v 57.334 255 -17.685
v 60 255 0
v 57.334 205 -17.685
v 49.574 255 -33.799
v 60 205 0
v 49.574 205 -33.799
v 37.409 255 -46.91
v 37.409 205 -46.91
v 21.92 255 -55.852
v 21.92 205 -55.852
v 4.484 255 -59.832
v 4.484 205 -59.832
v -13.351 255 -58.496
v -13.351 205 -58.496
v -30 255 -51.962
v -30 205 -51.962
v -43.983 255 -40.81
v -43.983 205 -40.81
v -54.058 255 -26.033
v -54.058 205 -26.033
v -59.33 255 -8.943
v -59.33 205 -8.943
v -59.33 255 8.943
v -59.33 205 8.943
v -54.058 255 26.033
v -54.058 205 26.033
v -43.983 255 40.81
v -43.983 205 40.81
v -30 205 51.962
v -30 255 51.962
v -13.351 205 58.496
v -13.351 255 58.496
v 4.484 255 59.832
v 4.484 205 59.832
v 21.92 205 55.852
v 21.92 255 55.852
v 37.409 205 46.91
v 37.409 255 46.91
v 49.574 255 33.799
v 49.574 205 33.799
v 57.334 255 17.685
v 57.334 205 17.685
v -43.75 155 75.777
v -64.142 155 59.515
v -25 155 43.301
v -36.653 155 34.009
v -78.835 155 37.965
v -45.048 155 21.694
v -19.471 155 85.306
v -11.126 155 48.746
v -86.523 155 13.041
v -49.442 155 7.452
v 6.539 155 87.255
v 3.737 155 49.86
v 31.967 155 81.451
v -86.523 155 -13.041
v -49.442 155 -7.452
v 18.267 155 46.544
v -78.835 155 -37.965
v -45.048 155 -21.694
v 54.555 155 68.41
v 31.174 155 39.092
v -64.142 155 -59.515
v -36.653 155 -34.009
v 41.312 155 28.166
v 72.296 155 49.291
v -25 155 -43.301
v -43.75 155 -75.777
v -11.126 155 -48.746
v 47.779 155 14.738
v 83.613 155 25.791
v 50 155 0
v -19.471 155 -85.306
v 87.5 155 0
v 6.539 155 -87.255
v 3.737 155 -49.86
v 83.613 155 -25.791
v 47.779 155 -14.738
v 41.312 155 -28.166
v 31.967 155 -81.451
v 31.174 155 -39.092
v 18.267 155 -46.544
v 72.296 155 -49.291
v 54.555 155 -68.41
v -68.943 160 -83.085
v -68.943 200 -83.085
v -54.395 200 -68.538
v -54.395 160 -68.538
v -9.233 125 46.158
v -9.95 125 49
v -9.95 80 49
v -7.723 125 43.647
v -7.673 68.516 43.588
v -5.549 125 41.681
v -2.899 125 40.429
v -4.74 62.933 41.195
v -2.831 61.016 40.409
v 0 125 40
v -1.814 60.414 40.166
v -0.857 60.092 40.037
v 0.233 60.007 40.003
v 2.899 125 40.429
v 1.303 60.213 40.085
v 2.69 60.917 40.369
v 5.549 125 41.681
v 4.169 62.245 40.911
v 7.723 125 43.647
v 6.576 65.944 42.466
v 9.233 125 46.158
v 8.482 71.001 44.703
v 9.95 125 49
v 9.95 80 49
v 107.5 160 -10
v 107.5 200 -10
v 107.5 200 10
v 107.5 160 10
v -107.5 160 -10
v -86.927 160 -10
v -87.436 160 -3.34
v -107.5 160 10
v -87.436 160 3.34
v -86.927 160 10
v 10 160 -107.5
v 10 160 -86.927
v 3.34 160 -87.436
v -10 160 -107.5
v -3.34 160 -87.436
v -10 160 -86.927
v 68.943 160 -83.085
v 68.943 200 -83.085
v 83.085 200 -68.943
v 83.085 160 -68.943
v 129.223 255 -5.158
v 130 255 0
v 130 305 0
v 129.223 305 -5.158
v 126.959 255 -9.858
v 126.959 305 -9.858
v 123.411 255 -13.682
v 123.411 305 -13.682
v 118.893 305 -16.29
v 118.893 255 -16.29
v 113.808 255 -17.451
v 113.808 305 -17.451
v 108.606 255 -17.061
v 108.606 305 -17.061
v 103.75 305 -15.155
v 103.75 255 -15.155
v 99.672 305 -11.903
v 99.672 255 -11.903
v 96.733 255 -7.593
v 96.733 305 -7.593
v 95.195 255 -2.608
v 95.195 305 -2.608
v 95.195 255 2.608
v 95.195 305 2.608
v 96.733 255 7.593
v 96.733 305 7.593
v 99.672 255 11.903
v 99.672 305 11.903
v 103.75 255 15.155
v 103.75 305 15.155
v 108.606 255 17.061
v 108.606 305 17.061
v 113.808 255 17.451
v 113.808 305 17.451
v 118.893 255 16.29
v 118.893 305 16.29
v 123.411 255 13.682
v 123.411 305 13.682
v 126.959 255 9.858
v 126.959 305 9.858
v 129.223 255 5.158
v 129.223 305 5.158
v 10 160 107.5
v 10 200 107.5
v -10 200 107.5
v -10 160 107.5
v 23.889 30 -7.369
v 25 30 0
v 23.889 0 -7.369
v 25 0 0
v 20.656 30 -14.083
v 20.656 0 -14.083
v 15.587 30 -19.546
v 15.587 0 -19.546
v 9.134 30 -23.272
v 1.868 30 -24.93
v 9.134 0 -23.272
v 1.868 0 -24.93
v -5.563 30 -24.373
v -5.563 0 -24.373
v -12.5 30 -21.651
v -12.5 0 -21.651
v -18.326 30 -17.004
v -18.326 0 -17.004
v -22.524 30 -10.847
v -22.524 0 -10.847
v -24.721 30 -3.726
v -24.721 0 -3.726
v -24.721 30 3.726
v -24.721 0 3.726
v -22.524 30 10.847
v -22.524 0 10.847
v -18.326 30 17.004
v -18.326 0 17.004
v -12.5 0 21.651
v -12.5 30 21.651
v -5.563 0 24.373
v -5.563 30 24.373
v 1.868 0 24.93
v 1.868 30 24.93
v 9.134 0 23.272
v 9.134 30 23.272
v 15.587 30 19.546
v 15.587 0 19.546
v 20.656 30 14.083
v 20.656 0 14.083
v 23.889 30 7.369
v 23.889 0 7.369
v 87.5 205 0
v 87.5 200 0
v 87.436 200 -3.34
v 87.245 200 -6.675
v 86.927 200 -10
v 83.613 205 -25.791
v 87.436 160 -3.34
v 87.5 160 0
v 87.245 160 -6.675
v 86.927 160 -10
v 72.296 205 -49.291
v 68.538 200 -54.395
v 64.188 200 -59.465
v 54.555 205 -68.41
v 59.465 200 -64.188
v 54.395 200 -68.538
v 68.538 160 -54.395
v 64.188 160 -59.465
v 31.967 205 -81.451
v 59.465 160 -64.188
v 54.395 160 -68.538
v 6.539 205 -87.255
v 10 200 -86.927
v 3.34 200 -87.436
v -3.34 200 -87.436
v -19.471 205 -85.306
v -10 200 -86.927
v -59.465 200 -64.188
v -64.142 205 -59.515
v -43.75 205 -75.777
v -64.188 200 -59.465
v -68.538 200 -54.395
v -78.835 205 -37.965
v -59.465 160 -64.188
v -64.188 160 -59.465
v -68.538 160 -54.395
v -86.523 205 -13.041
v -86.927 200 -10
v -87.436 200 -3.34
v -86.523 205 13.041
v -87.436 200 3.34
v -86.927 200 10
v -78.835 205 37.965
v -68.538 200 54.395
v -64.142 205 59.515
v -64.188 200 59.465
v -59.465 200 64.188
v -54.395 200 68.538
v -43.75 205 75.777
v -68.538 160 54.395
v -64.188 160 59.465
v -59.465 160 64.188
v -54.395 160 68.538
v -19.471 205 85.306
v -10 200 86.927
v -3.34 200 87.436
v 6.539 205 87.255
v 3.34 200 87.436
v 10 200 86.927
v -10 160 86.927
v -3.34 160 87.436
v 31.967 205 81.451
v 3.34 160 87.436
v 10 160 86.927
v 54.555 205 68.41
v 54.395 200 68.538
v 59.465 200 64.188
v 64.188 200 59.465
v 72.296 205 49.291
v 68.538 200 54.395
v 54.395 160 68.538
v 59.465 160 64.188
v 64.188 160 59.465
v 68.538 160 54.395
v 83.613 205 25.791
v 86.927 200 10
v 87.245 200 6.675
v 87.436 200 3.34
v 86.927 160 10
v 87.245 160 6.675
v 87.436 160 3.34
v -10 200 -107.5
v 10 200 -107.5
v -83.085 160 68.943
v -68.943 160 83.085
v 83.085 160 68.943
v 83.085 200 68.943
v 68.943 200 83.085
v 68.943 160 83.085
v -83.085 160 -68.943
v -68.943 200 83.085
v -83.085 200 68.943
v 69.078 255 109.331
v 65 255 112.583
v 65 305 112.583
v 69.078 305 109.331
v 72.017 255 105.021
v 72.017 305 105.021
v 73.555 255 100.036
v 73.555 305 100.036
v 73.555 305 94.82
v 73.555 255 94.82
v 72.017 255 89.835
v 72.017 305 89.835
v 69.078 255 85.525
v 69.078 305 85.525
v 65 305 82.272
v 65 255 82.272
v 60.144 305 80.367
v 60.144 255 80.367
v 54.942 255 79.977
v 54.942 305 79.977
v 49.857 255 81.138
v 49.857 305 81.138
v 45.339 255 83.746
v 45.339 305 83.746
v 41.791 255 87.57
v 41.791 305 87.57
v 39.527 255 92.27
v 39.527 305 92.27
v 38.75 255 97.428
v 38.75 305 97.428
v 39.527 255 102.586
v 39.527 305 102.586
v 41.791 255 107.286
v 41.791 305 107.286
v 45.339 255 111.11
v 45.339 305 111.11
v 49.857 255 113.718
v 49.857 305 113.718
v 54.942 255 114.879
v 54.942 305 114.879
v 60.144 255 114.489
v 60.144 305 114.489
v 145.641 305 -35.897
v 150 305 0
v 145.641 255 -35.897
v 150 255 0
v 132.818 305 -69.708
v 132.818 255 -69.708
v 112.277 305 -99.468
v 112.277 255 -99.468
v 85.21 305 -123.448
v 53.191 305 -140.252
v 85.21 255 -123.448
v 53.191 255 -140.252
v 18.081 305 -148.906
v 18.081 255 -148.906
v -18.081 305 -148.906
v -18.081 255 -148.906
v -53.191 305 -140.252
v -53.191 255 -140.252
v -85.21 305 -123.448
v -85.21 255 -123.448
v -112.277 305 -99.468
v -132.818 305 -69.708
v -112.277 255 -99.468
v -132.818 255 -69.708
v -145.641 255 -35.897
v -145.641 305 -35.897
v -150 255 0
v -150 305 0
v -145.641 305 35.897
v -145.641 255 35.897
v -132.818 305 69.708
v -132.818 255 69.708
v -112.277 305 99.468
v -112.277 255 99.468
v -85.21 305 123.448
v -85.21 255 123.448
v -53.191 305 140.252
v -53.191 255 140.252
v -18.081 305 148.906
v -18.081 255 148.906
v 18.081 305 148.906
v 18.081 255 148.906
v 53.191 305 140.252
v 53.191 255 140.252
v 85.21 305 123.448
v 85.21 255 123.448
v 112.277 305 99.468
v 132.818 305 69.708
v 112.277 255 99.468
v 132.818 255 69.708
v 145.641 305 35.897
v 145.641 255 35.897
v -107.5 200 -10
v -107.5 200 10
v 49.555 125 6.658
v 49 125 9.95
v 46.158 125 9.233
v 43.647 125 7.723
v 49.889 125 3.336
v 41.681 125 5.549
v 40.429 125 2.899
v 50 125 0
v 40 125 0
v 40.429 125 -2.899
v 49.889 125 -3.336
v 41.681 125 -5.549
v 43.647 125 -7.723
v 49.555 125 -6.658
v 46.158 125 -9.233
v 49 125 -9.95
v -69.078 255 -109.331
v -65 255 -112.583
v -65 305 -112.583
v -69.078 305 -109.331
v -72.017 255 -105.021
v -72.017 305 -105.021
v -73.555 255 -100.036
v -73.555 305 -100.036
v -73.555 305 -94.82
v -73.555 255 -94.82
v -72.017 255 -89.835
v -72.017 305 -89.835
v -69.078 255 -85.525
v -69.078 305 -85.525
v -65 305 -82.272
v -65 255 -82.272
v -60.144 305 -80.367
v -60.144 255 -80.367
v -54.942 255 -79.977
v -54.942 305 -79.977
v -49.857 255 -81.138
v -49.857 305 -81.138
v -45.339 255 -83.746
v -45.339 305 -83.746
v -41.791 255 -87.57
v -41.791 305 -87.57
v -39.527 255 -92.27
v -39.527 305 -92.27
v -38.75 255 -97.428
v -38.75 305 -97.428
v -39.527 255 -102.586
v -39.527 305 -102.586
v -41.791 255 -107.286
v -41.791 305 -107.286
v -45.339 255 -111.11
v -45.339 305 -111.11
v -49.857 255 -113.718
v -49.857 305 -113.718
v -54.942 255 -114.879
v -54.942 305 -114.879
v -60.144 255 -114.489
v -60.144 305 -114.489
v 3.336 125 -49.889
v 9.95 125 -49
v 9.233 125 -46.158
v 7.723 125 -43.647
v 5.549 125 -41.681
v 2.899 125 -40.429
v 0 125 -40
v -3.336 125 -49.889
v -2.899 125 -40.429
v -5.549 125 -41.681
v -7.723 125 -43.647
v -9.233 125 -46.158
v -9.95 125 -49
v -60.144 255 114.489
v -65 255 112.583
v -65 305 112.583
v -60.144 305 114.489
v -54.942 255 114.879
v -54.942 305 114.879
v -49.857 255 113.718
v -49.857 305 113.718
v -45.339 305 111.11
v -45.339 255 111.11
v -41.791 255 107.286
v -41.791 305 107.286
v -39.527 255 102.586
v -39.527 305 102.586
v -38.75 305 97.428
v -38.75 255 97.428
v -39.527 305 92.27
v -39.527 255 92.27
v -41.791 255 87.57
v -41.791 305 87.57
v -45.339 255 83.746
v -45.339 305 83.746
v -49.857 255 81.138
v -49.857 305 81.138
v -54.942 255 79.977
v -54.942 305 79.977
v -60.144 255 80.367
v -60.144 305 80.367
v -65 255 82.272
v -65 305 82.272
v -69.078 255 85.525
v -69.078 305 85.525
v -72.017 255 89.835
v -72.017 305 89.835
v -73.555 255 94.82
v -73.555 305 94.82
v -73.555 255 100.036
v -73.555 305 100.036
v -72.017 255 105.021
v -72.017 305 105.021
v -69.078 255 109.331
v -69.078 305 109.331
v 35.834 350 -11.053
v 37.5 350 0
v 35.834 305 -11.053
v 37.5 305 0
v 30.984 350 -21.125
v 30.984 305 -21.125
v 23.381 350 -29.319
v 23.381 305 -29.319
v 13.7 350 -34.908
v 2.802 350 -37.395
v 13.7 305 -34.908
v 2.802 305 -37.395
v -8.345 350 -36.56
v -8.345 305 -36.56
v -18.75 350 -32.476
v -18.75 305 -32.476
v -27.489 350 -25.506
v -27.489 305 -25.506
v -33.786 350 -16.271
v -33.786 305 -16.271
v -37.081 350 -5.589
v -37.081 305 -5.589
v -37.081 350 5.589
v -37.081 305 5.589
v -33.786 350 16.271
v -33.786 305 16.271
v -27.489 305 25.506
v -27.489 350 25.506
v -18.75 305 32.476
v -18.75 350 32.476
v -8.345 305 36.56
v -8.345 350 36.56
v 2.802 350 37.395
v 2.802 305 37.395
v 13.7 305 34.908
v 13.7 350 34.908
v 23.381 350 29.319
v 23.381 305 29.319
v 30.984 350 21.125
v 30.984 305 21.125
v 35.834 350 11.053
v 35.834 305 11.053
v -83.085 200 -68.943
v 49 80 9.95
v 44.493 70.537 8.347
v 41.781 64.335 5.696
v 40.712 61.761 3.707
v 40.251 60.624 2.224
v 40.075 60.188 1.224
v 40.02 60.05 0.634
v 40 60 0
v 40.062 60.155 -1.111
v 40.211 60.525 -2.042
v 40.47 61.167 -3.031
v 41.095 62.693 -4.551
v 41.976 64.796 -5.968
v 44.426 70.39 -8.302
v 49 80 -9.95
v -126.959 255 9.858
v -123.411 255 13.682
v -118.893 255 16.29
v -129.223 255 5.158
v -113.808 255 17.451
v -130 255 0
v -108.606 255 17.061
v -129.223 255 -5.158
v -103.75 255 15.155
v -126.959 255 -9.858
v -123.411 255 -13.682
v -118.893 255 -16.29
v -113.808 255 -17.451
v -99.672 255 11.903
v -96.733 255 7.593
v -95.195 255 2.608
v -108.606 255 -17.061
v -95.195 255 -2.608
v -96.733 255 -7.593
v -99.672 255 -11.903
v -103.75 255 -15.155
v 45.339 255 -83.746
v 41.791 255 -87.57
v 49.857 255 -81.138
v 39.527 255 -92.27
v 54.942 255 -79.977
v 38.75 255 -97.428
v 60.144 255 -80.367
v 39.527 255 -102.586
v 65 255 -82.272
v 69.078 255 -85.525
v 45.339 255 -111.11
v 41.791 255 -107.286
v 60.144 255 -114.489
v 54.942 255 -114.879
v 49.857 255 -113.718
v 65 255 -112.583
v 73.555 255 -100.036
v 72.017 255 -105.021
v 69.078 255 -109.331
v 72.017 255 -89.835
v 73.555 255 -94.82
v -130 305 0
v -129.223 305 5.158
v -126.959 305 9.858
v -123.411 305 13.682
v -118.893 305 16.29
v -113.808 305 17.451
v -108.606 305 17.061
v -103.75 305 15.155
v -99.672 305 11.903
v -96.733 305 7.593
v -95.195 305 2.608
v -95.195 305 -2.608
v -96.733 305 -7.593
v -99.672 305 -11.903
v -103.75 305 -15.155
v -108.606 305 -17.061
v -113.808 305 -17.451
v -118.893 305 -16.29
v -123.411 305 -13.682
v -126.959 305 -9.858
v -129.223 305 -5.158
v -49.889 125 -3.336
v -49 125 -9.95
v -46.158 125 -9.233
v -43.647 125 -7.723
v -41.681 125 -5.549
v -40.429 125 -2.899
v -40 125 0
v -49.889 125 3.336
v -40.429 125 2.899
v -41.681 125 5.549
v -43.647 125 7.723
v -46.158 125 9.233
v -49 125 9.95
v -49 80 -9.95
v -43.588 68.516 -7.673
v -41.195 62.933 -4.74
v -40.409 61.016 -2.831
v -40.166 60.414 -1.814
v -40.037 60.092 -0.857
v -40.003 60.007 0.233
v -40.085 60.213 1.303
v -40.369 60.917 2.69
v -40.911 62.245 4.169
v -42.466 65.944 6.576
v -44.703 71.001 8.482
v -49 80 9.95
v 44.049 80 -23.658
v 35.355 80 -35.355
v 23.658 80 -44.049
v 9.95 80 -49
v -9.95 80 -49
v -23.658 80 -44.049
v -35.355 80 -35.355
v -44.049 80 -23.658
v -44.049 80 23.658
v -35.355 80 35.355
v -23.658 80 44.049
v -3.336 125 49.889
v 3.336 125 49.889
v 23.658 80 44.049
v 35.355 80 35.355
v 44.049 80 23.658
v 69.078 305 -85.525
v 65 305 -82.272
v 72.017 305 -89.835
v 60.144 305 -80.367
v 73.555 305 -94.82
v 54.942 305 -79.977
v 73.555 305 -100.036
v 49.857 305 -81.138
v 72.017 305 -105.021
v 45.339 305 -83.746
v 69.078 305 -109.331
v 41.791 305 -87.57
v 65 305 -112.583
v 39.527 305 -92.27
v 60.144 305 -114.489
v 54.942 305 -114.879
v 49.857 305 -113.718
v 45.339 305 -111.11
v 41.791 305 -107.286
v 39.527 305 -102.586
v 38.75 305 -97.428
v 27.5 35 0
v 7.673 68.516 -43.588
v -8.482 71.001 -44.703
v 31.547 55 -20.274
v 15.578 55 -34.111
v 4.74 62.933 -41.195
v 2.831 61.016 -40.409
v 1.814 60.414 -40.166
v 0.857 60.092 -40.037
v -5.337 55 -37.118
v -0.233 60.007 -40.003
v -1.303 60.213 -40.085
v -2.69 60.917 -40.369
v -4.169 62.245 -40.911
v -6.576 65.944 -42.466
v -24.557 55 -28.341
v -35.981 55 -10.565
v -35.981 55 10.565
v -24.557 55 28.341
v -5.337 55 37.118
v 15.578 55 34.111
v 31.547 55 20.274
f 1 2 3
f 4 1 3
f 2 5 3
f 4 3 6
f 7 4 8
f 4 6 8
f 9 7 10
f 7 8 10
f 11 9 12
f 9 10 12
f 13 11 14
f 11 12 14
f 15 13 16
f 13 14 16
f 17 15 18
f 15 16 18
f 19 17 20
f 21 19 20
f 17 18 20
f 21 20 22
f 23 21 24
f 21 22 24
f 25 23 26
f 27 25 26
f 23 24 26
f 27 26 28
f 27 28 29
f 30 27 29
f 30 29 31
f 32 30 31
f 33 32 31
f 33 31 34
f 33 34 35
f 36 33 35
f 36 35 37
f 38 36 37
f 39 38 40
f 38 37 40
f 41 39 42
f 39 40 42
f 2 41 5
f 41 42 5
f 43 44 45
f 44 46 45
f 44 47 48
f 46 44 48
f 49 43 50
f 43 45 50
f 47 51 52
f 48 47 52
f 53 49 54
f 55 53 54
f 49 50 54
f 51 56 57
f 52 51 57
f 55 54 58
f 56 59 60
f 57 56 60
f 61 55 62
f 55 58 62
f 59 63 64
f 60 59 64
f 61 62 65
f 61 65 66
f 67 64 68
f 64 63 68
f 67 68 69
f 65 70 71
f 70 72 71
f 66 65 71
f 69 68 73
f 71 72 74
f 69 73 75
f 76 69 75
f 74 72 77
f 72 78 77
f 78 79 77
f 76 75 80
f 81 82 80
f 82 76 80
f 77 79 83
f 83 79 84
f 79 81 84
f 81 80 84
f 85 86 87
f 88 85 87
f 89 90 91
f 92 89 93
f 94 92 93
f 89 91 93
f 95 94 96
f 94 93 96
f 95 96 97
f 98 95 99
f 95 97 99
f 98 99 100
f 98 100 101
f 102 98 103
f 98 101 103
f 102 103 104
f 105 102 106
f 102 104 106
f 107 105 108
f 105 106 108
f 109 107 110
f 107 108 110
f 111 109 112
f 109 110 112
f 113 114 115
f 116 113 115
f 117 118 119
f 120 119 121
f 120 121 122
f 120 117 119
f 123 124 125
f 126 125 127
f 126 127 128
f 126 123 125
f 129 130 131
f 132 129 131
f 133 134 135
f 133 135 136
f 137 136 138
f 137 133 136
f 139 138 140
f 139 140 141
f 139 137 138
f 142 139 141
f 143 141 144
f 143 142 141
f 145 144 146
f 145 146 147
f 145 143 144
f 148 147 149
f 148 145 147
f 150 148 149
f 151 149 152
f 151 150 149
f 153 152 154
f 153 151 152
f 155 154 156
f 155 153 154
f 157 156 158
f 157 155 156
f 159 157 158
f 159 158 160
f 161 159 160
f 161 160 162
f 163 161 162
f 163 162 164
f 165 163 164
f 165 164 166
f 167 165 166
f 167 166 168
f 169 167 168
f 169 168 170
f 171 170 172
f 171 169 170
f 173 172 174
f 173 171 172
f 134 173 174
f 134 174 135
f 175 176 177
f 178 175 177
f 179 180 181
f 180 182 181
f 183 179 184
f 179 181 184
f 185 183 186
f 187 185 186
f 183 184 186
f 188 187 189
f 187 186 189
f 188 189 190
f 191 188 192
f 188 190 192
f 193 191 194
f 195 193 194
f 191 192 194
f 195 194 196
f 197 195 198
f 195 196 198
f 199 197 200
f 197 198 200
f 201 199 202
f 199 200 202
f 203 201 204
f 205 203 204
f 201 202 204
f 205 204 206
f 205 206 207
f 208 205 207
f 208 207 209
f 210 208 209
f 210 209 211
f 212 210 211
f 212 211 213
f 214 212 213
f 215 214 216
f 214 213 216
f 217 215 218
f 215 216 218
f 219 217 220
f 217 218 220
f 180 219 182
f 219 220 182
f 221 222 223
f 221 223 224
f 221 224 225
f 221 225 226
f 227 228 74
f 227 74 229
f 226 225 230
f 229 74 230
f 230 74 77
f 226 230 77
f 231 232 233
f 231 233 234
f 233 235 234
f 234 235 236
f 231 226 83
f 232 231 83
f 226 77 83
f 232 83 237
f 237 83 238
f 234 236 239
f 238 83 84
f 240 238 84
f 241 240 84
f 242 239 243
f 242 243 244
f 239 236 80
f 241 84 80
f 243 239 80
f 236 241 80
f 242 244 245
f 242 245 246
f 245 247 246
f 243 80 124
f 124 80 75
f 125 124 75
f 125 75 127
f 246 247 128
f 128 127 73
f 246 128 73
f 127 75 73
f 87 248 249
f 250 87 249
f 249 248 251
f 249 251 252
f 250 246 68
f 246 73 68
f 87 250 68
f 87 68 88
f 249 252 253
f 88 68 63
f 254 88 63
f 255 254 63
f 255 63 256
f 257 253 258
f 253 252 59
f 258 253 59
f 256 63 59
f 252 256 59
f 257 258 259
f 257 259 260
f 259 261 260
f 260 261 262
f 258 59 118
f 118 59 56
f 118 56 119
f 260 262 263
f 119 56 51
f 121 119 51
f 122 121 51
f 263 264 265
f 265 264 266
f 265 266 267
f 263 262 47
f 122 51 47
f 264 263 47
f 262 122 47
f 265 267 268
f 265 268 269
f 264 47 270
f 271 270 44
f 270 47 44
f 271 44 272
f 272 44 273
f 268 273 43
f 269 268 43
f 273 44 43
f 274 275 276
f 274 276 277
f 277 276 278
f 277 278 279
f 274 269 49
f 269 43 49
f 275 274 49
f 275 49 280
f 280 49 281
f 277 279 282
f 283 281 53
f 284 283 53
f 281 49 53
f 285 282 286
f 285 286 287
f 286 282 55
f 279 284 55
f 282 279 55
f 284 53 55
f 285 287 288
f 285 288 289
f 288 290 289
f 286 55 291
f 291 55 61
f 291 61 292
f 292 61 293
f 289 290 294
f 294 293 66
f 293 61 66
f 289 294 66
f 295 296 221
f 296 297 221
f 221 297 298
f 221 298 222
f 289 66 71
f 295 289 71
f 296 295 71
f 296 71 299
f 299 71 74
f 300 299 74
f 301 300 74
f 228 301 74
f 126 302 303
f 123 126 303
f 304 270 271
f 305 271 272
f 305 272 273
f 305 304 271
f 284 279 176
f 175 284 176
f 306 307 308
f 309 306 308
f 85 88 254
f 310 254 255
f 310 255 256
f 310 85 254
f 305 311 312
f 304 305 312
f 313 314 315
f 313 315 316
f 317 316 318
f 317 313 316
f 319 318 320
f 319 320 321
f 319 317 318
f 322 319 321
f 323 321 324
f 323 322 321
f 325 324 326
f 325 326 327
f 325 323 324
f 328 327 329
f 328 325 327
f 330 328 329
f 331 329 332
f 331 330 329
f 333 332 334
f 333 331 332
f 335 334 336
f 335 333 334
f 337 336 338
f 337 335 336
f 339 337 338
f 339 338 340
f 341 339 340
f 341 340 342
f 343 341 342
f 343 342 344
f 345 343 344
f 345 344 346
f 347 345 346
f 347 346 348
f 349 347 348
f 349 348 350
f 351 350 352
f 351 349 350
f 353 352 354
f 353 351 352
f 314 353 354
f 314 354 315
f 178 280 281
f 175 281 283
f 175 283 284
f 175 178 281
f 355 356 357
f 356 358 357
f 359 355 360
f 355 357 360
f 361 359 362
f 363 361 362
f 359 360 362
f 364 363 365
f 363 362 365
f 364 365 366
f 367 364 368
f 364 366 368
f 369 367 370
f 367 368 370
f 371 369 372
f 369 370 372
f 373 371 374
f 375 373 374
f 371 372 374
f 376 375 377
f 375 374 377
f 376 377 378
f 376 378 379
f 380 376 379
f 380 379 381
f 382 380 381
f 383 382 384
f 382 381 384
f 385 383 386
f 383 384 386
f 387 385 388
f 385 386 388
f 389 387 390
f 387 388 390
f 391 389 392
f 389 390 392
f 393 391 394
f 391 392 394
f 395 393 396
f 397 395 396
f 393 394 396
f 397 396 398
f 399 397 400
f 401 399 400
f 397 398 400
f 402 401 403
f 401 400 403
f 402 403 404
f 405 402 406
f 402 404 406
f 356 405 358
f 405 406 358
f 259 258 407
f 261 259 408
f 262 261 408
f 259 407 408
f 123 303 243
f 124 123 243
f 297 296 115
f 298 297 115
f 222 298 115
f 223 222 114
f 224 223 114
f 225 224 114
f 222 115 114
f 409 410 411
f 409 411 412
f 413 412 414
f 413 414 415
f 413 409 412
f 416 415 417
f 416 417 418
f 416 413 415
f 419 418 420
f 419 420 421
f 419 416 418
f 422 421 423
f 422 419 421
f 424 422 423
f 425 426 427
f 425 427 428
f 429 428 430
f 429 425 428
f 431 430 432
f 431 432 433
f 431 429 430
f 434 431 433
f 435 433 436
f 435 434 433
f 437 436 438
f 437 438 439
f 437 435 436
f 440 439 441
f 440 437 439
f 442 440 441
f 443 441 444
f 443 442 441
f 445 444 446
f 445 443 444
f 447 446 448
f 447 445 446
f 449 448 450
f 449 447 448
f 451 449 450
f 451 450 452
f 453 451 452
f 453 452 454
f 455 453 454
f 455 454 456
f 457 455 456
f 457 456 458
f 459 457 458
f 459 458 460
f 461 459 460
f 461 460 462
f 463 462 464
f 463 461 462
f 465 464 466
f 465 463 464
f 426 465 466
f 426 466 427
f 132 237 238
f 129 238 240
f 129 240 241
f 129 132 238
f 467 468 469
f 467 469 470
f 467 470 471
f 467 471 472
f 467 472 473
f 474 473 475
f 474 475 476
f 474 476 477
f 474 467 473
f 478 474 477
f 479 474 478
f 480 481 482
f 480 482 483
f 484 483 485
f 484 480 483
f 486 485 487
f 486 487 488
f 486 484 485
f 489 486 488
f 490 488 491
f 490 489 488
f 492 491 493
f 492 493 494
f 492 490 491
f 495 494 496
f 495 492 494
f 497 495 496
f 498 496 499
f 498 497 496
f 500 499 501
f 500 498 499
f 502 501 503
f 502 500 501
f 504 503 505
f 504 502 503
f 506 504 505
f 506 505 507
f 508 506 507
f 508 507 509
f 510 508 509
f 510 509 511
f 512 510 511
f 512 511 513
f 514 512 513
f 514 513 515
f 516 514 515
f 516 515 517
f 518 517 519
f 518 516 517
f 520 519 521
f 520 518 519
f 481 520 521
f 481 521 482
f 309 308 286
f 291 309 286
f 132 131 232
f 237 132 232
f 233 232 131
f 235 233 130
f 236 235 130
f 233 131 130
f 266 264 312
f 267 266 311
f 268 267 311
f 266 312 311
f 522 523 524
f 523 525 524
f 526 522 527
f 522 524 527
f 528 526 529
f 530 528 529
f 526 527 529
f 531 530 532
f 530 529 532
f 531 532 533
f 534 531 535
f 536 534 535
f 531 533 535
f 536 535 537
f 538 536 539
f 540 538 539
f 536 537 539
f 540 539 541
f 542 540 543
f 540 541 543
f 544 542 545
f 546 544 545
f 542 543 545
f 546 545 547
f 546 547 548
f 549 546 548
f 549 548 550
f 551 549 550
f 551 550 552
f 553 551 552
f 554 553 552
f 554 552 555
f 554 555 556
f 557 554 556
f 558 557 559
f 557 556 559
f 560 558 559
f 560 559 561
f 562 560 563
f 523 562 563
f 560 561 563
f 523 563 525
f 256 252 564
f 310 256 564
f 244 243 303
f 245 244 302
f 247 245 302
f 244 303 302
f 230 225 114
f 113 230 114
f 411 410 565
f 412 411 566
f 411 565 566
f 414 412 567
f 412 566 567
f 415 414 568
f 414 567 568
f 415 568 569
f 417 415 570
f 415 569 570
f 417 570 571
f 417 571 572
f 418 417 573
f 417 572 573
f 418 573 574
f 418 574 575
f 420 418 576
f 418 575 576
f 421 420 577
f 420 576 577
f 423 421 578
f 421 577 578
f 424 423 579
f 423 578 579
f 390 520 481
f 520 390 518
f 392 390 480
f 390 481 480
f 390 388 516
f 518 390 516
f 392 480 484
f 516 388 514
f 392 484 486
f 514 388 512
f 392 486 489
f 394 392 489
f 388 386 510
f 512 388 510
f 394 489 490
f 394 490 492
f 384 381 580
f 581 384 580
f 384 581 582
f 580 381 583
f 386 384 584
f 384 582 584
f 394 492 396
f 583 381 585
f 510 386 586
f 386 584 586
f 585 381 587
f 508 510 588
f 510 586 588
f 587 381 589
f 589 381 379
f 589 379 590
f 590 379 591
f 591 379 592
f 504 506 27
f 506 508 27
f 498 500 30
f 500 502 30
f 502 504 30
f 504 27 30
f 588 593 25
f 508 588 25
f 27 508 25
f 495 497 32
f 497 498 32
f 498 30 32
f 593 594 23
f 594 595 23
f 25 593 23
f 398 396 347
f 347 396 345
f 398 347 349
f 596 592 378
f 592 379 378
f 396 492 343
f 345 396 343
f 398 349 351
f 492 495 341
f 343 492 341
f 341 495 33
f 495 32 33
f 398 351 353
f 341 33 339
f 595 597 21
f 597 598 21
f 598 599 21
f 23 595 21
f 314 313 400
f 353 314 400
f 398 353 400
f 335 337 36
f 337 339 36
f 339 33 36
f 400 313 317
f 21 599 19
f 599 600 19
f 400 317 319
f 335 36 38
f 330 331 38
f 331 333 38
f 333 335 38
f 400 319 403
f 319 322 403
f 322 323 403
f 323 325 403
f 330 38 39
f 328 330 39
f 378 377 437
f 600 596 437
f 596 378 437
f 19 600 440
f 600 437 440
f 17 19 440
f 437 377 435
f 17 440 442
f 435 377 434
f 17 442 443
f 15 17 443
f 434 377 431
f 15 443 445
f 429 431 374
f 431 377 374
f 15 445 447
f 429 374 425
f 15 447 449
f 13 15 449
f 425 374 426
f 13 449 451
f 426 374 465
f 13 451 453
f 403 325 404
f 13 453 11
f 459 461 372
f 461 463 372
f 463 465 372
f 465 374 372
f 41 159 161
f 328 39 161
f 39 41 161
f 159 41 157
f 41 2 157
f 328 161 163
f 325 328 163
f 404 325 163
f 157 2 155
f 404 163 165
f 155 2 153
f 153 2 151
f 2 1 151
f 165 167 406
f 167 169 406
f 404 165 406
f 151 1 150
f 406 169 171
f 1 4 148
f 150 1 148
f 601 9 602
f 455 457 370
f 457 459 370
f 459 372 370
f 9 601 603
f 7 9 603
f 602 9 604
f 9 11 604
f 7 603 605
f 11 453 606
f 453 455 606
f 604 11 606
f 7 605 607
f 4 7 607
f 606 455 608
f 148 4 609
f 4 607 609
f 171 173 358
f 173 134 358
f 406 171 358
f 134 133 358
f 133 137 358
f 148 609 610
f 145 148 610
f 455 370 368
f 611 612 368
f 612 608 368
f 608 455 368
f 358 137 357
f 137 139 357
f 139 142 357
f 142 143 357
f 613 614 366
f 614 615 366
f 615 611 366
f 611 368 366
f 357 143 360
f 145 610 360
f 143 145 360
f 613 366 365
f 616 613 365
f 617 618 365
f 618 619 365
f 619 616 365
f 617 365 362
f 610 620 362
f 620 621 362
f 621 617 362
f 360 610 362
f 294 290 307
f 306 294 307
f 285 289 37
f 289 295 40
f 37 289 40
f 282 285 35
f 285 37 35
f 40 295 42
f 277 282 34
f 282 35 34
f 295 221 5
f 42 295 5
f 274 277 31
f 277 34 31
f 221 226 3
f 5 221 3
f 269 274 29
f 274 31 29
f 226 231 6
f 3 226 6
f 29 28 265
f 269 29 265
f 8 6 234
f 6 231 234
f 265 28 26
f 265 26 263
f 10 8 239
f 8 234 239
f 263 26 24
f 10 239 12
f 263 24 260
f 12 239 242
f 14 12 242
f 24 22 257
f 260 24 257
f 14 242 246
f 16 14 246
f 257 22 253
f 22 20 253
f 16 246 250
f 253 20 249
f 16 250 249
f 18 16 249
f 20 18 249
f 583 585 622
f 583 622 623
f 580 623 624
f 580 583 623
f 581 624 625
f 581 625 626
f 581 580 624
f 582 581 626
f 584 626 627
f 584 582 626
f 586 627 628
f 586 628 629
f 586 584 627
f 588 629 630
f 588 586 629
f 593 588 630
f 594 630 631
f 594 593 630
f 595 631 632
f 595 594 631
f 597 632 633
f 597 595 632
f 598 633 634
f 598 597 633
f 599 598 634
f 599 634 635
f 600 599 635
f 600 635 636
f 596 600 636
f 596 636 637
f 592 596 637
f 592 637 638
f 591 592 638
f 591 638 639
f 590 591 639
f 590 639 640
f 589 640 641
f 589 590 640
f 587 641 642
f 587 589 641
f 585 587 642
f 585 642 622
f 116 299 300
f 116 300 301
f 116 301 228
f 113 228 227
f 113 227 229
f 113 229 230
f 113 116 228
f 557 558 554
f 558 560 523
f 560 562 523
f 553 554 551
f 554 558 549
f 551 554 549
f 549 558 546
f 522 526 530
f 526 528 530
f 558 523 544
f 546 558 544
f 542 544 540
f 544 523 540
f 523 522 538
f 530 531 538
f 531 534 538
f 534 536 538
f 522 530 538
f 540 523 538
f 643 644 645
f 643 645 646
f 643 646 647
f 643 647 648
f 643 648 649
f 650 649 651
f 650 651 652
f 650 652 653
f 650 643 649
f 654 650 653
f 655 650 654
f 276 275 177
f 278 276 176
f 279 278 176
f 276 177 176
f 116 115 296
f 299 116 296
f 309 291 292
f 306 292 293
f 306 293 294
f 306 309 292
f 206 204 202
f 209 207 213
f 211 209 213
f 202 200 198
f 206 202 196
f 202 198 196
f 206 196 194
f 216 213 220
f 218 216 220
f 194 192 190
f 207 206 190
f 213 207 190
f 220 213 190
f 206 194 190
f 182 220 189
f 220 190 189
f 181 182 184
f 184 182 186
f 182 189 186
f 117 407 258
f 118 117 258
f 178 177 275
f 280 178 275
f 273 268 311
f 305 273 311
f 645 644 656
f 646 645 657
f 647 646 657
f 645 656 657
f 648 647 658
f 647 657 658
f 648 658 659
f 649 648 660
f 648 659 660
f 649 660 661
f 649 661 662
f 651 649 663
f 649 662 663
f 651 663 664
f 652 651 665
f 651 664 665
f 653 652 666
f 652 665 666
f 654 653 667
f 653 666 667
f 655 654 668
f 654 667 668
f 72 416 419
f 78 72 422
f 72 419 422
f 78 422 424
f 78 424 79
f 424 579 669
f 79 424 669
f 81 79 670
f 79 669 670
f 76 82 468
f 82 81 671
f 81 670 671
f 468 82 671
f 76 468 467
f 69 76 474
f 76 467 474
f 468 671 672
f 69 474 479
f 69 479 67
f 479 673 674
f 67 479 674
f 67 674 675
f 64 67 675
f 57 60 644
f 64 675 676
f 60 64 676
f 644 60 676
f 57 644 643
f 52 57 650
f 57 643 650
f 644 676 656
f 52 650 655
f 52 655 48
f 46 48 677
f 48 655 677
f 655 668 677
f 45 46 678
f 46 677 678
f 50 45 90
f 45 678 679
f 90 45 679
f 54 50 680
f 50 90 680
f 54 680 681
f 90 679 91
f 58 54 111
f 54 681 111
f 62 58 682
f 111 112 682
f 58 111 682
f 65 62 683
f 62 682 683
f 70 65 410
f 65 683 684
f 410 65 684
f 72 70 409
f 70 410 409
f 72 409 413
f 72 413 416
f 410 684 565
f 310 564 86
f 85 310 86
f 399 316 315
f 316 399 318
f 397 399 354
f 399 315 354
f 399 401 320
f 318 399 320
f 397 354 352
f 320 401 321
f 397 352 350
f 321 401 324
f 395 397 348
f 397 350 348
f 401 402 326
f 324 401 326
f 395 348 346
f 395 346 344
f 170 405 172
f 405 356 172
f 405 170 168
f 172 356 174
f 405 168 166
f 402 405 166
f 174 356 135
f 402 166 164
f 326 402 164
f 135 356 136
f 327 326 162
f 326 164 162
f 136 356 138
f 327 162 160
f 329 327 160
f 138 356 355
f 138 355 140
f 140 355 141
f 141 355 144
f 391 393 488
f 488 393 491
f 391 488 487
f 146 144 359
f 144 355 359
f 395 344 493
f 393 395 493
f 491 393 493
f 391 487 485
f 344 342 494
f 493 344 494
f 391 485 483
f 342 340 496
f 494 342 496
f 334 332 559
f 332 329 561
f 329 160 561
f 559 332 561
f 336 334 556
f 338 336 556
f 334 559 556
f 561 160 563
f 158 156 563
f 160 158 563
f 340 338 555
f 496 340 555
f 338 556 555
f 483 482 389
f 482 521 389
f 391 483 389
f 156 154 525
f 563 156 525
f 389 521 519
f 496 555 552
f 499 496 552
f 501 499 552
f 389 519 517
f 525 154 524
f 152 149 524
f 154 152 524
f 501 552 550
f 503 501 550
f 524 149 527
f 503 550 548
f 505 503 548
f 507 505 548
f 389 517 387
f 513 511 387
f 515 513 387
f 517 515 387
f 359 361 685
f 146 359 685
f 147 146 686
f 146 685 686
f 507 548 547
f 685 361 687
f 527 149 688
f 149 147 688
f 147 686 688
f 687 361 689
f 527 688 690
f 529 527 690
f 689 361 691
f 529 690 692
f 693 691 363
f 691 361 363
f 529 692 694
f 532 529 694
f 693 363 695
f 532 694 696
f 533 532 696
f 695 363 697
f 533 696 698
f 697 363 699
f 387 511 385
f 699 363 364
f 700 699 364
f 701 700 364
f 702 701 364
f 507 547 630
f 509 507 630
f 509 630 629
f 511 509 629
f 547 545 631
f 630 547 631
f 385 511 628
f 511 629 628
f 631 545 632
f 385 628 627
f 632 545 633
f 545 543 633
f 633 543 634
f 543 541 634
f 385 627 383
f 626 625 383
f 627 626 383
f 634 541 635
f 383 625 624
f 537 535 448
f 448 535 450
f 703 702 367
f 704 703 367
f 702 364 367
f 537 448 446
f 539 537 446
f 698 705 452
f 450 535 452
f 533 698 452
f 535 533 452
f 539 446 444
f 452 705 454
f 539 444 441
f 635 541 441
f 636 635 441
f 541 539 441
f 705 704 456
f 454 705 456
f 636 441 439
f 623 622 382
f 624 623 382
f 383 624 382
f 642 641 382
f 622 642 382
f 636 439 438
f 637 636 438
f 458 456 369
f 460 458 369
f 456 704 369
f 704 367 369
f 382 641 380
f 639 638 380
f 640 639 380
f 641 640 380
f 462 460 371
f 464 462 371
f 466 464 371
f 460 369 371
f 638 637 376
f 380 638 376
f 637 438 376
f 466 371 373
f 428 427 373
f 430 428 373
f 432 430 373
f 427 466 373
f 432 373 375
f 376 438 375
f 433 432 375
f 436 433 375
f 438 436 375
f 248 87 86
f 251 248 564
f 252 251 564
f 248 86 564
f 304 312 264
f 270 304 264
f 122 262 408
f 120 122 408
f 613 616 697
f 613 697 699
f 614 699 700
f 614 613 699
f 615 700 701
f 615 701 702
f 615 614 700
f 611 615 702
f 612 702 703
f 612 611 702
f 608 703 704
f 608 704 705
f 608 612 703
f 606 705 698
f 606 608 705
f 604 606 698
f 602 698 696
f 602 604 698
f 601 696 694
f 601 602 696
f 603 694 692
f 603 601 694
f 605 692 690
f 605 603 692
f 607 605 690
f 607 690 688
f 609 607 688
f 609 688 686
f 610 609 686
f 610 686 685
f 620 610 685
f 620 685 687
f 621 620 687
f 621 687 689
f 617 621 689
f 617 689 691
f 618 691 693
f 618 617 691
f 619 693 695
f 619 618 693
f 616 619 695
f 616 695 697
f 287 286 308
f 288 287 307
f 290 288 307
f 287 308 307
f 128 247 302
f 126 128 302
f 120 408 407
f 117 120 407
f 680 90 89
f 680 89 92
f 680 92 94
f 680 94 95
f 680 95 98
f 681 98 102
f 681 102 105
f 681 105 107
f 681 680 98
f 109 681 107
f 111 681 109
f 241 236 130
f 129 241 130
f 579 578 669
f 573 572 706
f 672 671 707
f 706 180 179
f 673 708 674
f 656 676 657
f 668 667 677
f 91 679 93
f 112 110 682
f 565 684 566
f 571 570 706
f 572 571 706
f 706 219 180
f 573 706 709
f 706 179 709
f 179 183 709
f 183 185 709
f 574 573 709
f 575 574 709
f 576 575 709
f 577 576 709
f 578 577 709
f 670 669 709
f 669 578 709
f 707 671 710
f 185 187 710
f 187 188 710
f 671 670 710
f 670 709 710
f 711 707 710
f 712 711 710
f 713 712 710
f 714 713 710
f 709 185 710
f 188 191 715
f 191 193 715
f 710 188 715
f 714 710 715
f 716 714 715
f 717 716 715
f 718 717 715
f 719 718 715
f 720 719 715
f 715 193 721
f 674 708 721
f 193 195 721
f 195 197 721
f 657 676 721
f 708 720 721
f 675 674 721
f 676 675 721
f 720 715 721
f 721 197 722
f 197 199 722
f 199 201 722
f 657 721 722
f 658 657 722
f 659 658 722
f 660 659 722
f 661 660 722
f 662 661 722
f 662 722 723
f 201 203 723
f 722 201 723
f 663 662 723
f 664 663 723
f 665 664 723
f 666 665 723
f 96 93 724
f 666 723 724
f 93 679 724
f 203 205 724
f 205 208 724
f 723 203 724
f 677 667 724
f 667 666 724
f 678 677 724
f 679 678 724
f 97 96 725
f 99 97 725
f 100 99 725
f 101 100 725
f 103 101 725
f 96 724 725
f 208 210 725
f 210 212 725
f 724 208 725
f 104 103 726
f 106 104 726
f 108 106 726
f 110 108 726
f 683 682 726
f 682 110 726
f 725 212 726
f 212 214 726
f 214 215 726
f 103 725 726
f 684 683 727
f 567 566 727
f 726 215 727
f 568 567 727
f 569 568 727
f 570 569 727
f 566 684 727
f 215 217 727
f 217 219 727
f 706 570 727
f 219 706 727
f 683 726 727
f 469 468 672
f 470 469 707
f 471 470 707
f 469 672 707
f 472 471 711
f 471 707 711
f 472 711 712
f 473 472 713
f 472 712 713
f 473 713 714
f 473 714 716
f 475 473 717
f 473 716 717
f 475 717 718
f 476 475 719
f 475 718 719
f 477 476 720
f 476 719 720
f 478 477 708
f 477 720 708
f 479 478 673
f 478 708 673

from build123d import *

# Parameters (mm, degrees)
HOLE2_START        = 255
HOLE2_OUTLINE_R    = 17.5
HOLE2_DEPTH        = 50
CIRPATTERN1_COUNT  = 6
RIB2_START         = -20
RIB2_DEPTH         = 40
CIRPATTERN2_COUNT  = 8
SKETCH13_R         = 10
CUT_EXTRUDE1_DEPTH = 125
CIRPATTERN3_COUNT  = 4


# Read off the part's stored shape, not the designer's step: Hole2, Rib2
with BuildPart() as part:
    # Sketch1 → Revolve1 (revolve)
    with BuildSketch(Plane.XY):
        Polygon((0, 0), (0, 350), (37.5, 350), (37.5, 305), (150, 305), (150, 255), (60, 255), (60, 205), (87.5, 205), (87.5, 155), (50, 155), (50, 80), (25, 30), (25, 0), align=None)
    revolve(axis=Axis((0, 0, 0), (0, 1, 0)))

    # Hole2 outline → Hole2 (cut)
    with BuildSketch(Plane(origin=(0, 0, 0), x_dir=(1, 0, 0), z_dir=(0, 1, 0)).offset(HOLE2_START)):
        with Locations((112.5, 0)):
            Circle(HOLE2_OUTLINE_R)
    hole2 = extrude(amount=HOLE2_DEPTH, mode=Mode.SUBTRACT)

    # CirPattern1: Hole2 ×6 about axis
    cirpattern1_axis = Axis((0, 0, 0), (0, 1, 0))
    for i in range(1, CIRPATTERN1_COUNT):
        add(hole2.rotate(cirpattern1_axis, i * 360 / CIRPATTERN1_COUNT), mode=Mode.SUBTRACT)

    # Rib2 outline → Rib2 (add)
    with BuildSketch(Plane(origin=(0, 180, 0), x_dir=(-1, 0, 0), z_dir=(0, -1, 0)).offset(RIB2_START)):
        with BuildLine():
            ThreePointArc((-10, 86.926693254), (0, 87.5), (10, 86.926693254))
            Line((10, 86.926693254), (10, 107.5))
            Line((10, 107.5), (-10, 107.5))
            Line((-10, 107.5), (-10, 86.926693254))
        make_face()
    rib2 = extrude(amount=RIB2_DEPTH)

    # CirPattern2: Rib2 ×8 about axis
    cirpattern2_axis = Axis((0, 0, 0), (0, 1, 0))
    for i in range(1, CIRPATTERN2_COUNT):
        add(rib2.rotate(cirpattern2_axis, i * 360 / CIRPATTERN2_COUNT))

    # Sketch13 → Cut-Extrude1 (cut)
    with BuildSketch(Plane.XZ):
        with Locations((0, 50)):
            Circle(SKETCH13_R)
    cut_extrude1 = extrude(amount=-CUT_EXTRUDE1_DEPTH, mode=Mode.SUBTRACT)

    # CirPattern3: Cut-Extrude1 ×4 about axis
    cirpattern3_axis = Axis((0, 0, 0), (0, 1, 0))
    for i in range(1, CIRPATTERN3_COUNT):
        add(cut_extrude1.rotate(cirpattern3_axis, i * 360 / CIRPATTERN3_COUNT), mode=Mode.SUBTRACT)


solid = part.part
